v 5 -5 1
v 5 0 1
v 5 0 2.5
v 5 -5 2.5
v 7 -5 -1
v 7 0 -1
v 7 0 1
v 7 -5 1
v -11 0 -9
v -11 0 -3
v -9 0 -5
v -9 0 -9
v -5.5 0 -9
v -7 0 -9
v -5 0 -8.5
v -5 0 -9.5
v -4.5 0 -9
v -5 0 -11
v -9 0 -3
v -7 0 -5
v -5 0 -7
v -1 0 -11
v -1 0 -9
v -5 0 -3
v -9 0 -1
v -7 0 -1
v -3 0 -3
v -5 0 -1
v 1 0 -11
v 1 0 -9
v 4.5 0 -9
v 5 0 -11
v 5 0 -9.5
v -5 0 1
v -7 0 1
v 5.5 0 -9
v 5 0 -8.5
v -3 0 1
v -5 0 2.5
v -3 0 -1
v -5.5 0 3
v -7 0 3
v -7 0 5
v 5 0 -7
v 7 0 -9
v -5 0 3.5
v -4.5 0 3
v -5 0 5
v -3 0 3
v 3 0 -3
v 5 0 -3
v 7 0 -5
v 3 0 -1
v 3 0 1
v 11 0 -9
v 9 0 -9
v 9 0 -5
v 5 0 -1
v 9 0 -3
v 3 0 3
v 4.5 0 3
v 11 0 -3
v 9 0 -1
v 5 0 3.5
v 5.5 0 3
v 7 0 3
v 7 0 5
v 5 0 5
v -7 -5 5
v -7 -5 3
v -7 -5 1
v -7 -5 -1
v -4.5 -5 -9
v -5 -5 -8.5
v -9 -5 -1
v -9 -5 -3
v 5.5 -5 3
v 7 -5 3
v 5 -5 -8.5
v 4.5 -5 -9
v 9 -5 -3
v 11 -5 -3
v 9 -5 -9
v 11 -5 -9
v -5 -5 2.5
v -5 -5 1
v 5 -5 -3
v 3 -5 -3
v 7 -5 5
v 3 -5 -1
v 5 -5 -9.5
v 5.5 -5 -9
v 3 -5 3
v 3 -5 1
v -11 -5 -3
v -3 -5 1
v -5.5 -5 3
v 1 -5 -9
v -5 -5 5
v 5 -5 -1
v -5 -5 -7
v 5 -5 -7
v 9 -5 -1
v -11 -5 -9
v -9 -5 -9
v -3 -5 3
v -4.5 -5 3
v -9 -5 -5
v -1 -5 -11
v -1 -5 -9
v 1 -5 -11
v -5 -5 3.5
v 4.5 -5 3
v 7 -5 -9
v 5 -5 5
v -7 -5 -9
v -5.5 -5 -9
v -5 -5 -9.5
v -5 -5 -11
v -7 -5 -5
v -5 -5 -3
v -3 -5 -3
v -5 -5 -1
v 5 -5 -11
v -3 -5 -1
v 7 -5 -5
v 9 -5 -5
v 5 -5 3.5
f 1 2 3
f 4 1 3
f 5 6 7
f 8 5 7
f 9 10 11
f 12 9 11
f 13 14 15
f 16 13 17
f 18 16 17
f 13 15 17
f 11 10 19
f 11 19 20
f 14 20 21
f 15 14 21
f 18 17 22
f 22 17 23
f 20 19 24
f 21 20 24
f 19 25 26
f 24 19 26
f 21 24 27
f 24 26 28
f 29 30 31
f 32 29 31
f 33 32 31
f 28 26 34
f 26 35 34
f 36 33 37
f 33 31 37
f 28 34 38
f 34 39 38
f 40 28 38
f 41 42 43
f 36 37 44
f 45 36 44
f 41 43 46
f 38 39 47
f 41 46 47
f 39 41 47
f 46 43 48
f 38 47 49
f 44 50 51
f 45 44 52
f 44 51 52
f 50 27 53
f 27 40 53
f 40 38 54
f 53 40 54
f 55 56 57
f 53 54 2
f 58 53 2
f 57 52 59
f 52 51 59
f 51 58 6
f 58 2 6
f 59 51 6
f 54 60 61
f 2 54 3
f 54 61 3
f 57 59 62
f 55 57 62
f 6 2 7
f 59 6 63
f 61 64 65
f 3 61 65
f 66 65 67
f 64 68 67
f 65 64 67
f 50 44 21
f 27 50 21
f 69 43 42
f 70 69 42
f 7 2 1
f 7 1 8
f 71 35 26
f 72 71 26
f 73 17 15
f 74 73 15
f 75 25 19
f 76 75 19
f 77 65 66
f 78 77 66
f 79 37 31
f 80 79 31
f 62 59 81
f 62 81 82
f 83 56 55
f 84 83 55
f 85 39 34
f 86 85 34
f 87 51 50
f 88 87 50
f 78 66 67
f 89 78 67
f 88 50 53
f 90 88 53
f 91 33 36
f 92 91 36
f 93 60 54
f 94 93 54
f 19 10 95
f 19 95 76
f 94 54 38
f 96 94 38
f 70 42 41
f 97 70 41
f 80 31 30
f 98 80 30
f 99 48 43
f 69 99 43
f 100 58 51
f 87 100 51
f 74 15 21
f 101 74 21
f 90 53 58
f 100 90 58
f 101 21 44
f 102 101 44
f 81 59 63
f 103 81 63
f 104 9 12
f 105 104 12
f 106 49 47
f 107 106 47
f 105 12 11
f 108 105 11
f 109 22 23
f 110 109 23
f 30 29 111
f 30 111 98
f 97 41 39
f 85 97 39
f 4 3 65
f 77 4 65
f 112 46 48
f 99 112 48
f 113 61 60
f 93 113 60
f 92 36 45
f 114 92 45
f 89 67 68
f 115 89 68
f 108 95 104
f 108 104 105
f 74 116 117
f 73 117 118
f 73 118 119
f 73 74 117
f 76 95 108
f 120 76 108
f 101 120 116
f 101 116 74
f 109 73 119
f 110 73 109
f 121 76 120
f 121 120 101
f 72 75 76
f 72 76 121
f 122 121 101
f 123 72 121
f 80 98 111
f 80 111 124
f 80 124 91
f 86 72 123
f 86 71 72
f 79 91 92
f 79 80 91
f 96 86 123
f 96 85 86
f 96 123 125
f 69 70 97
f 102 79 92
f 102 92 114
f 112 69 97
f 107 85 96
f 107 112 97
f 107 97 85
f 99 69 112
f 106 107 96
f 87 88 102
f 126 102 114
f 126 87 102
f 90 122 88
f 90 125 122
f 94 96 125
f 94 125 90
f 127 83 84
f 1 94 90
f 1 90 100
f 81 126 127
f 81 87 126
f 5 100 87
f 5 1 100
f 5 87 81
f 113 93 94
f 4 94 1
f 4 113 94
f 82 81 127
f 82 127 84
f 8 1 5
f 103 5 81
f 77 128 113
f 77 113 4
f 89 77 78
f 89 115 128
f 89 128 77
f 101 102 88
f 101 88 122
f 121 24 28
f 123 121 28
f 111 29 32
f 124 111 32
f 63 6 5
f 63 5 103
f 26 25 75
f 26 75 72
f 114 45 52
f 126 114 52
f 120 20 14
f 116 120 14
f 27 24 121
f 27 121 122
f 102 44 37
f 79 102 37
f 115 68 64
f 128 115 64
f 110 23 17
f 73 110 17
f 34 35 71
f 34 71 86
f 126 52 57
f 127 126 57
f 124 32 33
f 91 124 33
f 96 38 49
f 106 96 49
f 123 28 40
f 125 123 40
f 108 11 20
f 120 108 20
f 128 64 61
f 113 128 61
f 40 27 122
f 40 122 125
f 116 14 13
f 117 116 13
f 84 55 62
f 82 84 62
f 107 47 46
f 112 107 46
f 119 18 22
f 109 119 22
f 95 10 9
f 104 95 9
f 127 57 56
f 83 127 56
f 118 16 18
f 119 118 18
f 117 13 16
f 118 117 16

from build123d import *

# Parameters (mm, degrees)
F0_W     = 2
F0_H     = 2
F1_DEPTH = 5


with BuildPart() as f1:
    # F0 (on Front) → F1 (new body)
    with BuildSketch(Plane.XZ):
        Rectangle(F0_W, F0_H)
        with Locations((2, 0)):
            Rectangle(F0_W, F0_H)
        with Locations((-2, 0)):
            Rectangle(F0_W, F0_H)
        with Locations((4, 0)):
            Rectangle(F0_W, F0_H)
        Polygon((3, 3), (3, 1), (5, 1), (5, 2.5), (5, 3), (4.5, 3), align=None)
        Polygon((-5, 1), (-3, 1), (-3, 3), (-4, 3), (-4.5, 3), (-5, 3), (-5, 2.5), (-5, 2), align=None)
        with Locations((-4, 0)):
            Rectangle(F0_W, F0_H)
        with Locations((6, 0)):
            Rectangle(F0_W, F0_H)
        with Locations((-6, 0)):
            Rectangle(F0_W, F0_H)
        with Locations((6, -2)):
            Rectangle(F0_W, F0_H)
        with Locations((2, -6)):
            Rectangle(F0_W, F0_H)
        with Locations((0, -6)):
            Rectangle(F0_W, F0_H)
        Polygon((5, 3), (5, 2.5), (5.5, 3), align=None)
        Polygon((5, 3.5), (4.5, 3), (5, 3), align=None)
        with Locations((-2, -6)):
            Rectangle(F0_W, F0_H)
        with Locations((-6, -2)):
            Rectangle(F0_W, F0_H)
        with Locations((6, -4)):
            Rectangle(F0_W, F0_H)
        with Locations((4, -6)):
            Rectangle(F0_W, F0_H)
        with Locations((8, -2)):
            Rectangle(F0_W, F0_H)
        Polygon((5, 3.5), (5, 3), (5.5, 3), (7, 3), (7, 5), (5, 5), align=None)
        with Locations((-4, -6)):
            Rectangle(F0_W, F0_H)
        with Locations((-6, -4)):
            Rectangle(F0_W, F0_H)
        with Locations((-8, -2)):
            Rectangle(F0_W, F0_H)
        Polygon((-5, 3), (-4.5, 3), (-5, 3.5), align=None)
        Polygon((-5.5, 3), (-5, 2.5), (-5, 3), align=None)
        with Locations((8, -4)):
            Rectangle(F0_W, F0_H)
        with Locations((6, -6)):
            Rectangle(F0_W, F0_H)
        with Locations((-6, -6)):
            Rectangle(F0_W, F0_H)
        with Locations((-8, -4)):
            Rectangle(F0_W, F0_H)
        Polygon((-5.5, 3), (-5, 3), (-5, 3.5), (-5, 4), (-5, 5), (-7, 5), (-7, 3), (-6, 3), align=None)
        with Locations((10, -4)):
            Rectangle(F0_W, F0_H)
        Polygon((7, -7), (5, -7), (5, -8.5), (5, -9), (5.5, -9), (7, -9), align=None)
        Polygon((-5, -8), (-5, -7), (-7, -7), (-7, -9), (-6, -9), (-5.5, -9), (-5, -9), (-5, -8.5), align=None)
        with Locations((-10, -4)):
            Rectangle(F0_W, F0_H)
        with Locations((10, -6)):
            Rectangle(F0_W, F0_H)
        Polygon((5, -9), (5, -8.5), (4.5, -9), align=None)
        with Locations((-10, -6)):
            Rectangle(F0_W, F0_H)
        with Locations((10, -8)):
            Rectangle(F0_W, F0_H)
        Polygon((5, -9.5), (5, -9), (4.5, -9), (3, -9), (3, -11), (5, -11), align=None)
        Polygon((5.5, -9), (5, -9), (5, -9.5), align=None)
        Polygon((-4.5, -9), (-5, -8.5), (-5, -9), align=None)
        with Locations((-10, -8)):
            Rectangle(F0_W, F0_H)
        with Locations((2, -10)):
            Rectangle(F0_W, F0_H)
        Polygon((-4.5, -9), (-5, -9), (-5, -9.5), (-5, -10), (-5, -11), (-3, -11), (-3, -9), (-4, -9), align=None)
        Polygon((-5, -9.5), (-5, -9), (-5.5, -9), align=None)
        with Locations((-2, -10)):
            Rectangle(F0_W, F0_H)
        with Locations((-2, -2)):
            Rectangle(F0_W, F0_H)
        with Locations((-4, -4)):
            Rectangle(F0_W, F0_H)
        with Locations((-2, -4)):
            Rectangle(F0_W, F0_H)
        with Locations((0, -4)):
            Rectangle(F0_W, F0_H)
        with Locations((0, -2)):
            Rectangle(F0_W, F0_H)
        with Locations((4, -4)):
            Rectangle(F0_W, F0_H)
        with Locations((2, -4)):
            Rectangle(F0_W, F0_H)
        with Locations((2, -2)):
            Rectangle(F0_W, F0_H)
    extrude(amount=F1_DEPTH)


solid = f1.part
